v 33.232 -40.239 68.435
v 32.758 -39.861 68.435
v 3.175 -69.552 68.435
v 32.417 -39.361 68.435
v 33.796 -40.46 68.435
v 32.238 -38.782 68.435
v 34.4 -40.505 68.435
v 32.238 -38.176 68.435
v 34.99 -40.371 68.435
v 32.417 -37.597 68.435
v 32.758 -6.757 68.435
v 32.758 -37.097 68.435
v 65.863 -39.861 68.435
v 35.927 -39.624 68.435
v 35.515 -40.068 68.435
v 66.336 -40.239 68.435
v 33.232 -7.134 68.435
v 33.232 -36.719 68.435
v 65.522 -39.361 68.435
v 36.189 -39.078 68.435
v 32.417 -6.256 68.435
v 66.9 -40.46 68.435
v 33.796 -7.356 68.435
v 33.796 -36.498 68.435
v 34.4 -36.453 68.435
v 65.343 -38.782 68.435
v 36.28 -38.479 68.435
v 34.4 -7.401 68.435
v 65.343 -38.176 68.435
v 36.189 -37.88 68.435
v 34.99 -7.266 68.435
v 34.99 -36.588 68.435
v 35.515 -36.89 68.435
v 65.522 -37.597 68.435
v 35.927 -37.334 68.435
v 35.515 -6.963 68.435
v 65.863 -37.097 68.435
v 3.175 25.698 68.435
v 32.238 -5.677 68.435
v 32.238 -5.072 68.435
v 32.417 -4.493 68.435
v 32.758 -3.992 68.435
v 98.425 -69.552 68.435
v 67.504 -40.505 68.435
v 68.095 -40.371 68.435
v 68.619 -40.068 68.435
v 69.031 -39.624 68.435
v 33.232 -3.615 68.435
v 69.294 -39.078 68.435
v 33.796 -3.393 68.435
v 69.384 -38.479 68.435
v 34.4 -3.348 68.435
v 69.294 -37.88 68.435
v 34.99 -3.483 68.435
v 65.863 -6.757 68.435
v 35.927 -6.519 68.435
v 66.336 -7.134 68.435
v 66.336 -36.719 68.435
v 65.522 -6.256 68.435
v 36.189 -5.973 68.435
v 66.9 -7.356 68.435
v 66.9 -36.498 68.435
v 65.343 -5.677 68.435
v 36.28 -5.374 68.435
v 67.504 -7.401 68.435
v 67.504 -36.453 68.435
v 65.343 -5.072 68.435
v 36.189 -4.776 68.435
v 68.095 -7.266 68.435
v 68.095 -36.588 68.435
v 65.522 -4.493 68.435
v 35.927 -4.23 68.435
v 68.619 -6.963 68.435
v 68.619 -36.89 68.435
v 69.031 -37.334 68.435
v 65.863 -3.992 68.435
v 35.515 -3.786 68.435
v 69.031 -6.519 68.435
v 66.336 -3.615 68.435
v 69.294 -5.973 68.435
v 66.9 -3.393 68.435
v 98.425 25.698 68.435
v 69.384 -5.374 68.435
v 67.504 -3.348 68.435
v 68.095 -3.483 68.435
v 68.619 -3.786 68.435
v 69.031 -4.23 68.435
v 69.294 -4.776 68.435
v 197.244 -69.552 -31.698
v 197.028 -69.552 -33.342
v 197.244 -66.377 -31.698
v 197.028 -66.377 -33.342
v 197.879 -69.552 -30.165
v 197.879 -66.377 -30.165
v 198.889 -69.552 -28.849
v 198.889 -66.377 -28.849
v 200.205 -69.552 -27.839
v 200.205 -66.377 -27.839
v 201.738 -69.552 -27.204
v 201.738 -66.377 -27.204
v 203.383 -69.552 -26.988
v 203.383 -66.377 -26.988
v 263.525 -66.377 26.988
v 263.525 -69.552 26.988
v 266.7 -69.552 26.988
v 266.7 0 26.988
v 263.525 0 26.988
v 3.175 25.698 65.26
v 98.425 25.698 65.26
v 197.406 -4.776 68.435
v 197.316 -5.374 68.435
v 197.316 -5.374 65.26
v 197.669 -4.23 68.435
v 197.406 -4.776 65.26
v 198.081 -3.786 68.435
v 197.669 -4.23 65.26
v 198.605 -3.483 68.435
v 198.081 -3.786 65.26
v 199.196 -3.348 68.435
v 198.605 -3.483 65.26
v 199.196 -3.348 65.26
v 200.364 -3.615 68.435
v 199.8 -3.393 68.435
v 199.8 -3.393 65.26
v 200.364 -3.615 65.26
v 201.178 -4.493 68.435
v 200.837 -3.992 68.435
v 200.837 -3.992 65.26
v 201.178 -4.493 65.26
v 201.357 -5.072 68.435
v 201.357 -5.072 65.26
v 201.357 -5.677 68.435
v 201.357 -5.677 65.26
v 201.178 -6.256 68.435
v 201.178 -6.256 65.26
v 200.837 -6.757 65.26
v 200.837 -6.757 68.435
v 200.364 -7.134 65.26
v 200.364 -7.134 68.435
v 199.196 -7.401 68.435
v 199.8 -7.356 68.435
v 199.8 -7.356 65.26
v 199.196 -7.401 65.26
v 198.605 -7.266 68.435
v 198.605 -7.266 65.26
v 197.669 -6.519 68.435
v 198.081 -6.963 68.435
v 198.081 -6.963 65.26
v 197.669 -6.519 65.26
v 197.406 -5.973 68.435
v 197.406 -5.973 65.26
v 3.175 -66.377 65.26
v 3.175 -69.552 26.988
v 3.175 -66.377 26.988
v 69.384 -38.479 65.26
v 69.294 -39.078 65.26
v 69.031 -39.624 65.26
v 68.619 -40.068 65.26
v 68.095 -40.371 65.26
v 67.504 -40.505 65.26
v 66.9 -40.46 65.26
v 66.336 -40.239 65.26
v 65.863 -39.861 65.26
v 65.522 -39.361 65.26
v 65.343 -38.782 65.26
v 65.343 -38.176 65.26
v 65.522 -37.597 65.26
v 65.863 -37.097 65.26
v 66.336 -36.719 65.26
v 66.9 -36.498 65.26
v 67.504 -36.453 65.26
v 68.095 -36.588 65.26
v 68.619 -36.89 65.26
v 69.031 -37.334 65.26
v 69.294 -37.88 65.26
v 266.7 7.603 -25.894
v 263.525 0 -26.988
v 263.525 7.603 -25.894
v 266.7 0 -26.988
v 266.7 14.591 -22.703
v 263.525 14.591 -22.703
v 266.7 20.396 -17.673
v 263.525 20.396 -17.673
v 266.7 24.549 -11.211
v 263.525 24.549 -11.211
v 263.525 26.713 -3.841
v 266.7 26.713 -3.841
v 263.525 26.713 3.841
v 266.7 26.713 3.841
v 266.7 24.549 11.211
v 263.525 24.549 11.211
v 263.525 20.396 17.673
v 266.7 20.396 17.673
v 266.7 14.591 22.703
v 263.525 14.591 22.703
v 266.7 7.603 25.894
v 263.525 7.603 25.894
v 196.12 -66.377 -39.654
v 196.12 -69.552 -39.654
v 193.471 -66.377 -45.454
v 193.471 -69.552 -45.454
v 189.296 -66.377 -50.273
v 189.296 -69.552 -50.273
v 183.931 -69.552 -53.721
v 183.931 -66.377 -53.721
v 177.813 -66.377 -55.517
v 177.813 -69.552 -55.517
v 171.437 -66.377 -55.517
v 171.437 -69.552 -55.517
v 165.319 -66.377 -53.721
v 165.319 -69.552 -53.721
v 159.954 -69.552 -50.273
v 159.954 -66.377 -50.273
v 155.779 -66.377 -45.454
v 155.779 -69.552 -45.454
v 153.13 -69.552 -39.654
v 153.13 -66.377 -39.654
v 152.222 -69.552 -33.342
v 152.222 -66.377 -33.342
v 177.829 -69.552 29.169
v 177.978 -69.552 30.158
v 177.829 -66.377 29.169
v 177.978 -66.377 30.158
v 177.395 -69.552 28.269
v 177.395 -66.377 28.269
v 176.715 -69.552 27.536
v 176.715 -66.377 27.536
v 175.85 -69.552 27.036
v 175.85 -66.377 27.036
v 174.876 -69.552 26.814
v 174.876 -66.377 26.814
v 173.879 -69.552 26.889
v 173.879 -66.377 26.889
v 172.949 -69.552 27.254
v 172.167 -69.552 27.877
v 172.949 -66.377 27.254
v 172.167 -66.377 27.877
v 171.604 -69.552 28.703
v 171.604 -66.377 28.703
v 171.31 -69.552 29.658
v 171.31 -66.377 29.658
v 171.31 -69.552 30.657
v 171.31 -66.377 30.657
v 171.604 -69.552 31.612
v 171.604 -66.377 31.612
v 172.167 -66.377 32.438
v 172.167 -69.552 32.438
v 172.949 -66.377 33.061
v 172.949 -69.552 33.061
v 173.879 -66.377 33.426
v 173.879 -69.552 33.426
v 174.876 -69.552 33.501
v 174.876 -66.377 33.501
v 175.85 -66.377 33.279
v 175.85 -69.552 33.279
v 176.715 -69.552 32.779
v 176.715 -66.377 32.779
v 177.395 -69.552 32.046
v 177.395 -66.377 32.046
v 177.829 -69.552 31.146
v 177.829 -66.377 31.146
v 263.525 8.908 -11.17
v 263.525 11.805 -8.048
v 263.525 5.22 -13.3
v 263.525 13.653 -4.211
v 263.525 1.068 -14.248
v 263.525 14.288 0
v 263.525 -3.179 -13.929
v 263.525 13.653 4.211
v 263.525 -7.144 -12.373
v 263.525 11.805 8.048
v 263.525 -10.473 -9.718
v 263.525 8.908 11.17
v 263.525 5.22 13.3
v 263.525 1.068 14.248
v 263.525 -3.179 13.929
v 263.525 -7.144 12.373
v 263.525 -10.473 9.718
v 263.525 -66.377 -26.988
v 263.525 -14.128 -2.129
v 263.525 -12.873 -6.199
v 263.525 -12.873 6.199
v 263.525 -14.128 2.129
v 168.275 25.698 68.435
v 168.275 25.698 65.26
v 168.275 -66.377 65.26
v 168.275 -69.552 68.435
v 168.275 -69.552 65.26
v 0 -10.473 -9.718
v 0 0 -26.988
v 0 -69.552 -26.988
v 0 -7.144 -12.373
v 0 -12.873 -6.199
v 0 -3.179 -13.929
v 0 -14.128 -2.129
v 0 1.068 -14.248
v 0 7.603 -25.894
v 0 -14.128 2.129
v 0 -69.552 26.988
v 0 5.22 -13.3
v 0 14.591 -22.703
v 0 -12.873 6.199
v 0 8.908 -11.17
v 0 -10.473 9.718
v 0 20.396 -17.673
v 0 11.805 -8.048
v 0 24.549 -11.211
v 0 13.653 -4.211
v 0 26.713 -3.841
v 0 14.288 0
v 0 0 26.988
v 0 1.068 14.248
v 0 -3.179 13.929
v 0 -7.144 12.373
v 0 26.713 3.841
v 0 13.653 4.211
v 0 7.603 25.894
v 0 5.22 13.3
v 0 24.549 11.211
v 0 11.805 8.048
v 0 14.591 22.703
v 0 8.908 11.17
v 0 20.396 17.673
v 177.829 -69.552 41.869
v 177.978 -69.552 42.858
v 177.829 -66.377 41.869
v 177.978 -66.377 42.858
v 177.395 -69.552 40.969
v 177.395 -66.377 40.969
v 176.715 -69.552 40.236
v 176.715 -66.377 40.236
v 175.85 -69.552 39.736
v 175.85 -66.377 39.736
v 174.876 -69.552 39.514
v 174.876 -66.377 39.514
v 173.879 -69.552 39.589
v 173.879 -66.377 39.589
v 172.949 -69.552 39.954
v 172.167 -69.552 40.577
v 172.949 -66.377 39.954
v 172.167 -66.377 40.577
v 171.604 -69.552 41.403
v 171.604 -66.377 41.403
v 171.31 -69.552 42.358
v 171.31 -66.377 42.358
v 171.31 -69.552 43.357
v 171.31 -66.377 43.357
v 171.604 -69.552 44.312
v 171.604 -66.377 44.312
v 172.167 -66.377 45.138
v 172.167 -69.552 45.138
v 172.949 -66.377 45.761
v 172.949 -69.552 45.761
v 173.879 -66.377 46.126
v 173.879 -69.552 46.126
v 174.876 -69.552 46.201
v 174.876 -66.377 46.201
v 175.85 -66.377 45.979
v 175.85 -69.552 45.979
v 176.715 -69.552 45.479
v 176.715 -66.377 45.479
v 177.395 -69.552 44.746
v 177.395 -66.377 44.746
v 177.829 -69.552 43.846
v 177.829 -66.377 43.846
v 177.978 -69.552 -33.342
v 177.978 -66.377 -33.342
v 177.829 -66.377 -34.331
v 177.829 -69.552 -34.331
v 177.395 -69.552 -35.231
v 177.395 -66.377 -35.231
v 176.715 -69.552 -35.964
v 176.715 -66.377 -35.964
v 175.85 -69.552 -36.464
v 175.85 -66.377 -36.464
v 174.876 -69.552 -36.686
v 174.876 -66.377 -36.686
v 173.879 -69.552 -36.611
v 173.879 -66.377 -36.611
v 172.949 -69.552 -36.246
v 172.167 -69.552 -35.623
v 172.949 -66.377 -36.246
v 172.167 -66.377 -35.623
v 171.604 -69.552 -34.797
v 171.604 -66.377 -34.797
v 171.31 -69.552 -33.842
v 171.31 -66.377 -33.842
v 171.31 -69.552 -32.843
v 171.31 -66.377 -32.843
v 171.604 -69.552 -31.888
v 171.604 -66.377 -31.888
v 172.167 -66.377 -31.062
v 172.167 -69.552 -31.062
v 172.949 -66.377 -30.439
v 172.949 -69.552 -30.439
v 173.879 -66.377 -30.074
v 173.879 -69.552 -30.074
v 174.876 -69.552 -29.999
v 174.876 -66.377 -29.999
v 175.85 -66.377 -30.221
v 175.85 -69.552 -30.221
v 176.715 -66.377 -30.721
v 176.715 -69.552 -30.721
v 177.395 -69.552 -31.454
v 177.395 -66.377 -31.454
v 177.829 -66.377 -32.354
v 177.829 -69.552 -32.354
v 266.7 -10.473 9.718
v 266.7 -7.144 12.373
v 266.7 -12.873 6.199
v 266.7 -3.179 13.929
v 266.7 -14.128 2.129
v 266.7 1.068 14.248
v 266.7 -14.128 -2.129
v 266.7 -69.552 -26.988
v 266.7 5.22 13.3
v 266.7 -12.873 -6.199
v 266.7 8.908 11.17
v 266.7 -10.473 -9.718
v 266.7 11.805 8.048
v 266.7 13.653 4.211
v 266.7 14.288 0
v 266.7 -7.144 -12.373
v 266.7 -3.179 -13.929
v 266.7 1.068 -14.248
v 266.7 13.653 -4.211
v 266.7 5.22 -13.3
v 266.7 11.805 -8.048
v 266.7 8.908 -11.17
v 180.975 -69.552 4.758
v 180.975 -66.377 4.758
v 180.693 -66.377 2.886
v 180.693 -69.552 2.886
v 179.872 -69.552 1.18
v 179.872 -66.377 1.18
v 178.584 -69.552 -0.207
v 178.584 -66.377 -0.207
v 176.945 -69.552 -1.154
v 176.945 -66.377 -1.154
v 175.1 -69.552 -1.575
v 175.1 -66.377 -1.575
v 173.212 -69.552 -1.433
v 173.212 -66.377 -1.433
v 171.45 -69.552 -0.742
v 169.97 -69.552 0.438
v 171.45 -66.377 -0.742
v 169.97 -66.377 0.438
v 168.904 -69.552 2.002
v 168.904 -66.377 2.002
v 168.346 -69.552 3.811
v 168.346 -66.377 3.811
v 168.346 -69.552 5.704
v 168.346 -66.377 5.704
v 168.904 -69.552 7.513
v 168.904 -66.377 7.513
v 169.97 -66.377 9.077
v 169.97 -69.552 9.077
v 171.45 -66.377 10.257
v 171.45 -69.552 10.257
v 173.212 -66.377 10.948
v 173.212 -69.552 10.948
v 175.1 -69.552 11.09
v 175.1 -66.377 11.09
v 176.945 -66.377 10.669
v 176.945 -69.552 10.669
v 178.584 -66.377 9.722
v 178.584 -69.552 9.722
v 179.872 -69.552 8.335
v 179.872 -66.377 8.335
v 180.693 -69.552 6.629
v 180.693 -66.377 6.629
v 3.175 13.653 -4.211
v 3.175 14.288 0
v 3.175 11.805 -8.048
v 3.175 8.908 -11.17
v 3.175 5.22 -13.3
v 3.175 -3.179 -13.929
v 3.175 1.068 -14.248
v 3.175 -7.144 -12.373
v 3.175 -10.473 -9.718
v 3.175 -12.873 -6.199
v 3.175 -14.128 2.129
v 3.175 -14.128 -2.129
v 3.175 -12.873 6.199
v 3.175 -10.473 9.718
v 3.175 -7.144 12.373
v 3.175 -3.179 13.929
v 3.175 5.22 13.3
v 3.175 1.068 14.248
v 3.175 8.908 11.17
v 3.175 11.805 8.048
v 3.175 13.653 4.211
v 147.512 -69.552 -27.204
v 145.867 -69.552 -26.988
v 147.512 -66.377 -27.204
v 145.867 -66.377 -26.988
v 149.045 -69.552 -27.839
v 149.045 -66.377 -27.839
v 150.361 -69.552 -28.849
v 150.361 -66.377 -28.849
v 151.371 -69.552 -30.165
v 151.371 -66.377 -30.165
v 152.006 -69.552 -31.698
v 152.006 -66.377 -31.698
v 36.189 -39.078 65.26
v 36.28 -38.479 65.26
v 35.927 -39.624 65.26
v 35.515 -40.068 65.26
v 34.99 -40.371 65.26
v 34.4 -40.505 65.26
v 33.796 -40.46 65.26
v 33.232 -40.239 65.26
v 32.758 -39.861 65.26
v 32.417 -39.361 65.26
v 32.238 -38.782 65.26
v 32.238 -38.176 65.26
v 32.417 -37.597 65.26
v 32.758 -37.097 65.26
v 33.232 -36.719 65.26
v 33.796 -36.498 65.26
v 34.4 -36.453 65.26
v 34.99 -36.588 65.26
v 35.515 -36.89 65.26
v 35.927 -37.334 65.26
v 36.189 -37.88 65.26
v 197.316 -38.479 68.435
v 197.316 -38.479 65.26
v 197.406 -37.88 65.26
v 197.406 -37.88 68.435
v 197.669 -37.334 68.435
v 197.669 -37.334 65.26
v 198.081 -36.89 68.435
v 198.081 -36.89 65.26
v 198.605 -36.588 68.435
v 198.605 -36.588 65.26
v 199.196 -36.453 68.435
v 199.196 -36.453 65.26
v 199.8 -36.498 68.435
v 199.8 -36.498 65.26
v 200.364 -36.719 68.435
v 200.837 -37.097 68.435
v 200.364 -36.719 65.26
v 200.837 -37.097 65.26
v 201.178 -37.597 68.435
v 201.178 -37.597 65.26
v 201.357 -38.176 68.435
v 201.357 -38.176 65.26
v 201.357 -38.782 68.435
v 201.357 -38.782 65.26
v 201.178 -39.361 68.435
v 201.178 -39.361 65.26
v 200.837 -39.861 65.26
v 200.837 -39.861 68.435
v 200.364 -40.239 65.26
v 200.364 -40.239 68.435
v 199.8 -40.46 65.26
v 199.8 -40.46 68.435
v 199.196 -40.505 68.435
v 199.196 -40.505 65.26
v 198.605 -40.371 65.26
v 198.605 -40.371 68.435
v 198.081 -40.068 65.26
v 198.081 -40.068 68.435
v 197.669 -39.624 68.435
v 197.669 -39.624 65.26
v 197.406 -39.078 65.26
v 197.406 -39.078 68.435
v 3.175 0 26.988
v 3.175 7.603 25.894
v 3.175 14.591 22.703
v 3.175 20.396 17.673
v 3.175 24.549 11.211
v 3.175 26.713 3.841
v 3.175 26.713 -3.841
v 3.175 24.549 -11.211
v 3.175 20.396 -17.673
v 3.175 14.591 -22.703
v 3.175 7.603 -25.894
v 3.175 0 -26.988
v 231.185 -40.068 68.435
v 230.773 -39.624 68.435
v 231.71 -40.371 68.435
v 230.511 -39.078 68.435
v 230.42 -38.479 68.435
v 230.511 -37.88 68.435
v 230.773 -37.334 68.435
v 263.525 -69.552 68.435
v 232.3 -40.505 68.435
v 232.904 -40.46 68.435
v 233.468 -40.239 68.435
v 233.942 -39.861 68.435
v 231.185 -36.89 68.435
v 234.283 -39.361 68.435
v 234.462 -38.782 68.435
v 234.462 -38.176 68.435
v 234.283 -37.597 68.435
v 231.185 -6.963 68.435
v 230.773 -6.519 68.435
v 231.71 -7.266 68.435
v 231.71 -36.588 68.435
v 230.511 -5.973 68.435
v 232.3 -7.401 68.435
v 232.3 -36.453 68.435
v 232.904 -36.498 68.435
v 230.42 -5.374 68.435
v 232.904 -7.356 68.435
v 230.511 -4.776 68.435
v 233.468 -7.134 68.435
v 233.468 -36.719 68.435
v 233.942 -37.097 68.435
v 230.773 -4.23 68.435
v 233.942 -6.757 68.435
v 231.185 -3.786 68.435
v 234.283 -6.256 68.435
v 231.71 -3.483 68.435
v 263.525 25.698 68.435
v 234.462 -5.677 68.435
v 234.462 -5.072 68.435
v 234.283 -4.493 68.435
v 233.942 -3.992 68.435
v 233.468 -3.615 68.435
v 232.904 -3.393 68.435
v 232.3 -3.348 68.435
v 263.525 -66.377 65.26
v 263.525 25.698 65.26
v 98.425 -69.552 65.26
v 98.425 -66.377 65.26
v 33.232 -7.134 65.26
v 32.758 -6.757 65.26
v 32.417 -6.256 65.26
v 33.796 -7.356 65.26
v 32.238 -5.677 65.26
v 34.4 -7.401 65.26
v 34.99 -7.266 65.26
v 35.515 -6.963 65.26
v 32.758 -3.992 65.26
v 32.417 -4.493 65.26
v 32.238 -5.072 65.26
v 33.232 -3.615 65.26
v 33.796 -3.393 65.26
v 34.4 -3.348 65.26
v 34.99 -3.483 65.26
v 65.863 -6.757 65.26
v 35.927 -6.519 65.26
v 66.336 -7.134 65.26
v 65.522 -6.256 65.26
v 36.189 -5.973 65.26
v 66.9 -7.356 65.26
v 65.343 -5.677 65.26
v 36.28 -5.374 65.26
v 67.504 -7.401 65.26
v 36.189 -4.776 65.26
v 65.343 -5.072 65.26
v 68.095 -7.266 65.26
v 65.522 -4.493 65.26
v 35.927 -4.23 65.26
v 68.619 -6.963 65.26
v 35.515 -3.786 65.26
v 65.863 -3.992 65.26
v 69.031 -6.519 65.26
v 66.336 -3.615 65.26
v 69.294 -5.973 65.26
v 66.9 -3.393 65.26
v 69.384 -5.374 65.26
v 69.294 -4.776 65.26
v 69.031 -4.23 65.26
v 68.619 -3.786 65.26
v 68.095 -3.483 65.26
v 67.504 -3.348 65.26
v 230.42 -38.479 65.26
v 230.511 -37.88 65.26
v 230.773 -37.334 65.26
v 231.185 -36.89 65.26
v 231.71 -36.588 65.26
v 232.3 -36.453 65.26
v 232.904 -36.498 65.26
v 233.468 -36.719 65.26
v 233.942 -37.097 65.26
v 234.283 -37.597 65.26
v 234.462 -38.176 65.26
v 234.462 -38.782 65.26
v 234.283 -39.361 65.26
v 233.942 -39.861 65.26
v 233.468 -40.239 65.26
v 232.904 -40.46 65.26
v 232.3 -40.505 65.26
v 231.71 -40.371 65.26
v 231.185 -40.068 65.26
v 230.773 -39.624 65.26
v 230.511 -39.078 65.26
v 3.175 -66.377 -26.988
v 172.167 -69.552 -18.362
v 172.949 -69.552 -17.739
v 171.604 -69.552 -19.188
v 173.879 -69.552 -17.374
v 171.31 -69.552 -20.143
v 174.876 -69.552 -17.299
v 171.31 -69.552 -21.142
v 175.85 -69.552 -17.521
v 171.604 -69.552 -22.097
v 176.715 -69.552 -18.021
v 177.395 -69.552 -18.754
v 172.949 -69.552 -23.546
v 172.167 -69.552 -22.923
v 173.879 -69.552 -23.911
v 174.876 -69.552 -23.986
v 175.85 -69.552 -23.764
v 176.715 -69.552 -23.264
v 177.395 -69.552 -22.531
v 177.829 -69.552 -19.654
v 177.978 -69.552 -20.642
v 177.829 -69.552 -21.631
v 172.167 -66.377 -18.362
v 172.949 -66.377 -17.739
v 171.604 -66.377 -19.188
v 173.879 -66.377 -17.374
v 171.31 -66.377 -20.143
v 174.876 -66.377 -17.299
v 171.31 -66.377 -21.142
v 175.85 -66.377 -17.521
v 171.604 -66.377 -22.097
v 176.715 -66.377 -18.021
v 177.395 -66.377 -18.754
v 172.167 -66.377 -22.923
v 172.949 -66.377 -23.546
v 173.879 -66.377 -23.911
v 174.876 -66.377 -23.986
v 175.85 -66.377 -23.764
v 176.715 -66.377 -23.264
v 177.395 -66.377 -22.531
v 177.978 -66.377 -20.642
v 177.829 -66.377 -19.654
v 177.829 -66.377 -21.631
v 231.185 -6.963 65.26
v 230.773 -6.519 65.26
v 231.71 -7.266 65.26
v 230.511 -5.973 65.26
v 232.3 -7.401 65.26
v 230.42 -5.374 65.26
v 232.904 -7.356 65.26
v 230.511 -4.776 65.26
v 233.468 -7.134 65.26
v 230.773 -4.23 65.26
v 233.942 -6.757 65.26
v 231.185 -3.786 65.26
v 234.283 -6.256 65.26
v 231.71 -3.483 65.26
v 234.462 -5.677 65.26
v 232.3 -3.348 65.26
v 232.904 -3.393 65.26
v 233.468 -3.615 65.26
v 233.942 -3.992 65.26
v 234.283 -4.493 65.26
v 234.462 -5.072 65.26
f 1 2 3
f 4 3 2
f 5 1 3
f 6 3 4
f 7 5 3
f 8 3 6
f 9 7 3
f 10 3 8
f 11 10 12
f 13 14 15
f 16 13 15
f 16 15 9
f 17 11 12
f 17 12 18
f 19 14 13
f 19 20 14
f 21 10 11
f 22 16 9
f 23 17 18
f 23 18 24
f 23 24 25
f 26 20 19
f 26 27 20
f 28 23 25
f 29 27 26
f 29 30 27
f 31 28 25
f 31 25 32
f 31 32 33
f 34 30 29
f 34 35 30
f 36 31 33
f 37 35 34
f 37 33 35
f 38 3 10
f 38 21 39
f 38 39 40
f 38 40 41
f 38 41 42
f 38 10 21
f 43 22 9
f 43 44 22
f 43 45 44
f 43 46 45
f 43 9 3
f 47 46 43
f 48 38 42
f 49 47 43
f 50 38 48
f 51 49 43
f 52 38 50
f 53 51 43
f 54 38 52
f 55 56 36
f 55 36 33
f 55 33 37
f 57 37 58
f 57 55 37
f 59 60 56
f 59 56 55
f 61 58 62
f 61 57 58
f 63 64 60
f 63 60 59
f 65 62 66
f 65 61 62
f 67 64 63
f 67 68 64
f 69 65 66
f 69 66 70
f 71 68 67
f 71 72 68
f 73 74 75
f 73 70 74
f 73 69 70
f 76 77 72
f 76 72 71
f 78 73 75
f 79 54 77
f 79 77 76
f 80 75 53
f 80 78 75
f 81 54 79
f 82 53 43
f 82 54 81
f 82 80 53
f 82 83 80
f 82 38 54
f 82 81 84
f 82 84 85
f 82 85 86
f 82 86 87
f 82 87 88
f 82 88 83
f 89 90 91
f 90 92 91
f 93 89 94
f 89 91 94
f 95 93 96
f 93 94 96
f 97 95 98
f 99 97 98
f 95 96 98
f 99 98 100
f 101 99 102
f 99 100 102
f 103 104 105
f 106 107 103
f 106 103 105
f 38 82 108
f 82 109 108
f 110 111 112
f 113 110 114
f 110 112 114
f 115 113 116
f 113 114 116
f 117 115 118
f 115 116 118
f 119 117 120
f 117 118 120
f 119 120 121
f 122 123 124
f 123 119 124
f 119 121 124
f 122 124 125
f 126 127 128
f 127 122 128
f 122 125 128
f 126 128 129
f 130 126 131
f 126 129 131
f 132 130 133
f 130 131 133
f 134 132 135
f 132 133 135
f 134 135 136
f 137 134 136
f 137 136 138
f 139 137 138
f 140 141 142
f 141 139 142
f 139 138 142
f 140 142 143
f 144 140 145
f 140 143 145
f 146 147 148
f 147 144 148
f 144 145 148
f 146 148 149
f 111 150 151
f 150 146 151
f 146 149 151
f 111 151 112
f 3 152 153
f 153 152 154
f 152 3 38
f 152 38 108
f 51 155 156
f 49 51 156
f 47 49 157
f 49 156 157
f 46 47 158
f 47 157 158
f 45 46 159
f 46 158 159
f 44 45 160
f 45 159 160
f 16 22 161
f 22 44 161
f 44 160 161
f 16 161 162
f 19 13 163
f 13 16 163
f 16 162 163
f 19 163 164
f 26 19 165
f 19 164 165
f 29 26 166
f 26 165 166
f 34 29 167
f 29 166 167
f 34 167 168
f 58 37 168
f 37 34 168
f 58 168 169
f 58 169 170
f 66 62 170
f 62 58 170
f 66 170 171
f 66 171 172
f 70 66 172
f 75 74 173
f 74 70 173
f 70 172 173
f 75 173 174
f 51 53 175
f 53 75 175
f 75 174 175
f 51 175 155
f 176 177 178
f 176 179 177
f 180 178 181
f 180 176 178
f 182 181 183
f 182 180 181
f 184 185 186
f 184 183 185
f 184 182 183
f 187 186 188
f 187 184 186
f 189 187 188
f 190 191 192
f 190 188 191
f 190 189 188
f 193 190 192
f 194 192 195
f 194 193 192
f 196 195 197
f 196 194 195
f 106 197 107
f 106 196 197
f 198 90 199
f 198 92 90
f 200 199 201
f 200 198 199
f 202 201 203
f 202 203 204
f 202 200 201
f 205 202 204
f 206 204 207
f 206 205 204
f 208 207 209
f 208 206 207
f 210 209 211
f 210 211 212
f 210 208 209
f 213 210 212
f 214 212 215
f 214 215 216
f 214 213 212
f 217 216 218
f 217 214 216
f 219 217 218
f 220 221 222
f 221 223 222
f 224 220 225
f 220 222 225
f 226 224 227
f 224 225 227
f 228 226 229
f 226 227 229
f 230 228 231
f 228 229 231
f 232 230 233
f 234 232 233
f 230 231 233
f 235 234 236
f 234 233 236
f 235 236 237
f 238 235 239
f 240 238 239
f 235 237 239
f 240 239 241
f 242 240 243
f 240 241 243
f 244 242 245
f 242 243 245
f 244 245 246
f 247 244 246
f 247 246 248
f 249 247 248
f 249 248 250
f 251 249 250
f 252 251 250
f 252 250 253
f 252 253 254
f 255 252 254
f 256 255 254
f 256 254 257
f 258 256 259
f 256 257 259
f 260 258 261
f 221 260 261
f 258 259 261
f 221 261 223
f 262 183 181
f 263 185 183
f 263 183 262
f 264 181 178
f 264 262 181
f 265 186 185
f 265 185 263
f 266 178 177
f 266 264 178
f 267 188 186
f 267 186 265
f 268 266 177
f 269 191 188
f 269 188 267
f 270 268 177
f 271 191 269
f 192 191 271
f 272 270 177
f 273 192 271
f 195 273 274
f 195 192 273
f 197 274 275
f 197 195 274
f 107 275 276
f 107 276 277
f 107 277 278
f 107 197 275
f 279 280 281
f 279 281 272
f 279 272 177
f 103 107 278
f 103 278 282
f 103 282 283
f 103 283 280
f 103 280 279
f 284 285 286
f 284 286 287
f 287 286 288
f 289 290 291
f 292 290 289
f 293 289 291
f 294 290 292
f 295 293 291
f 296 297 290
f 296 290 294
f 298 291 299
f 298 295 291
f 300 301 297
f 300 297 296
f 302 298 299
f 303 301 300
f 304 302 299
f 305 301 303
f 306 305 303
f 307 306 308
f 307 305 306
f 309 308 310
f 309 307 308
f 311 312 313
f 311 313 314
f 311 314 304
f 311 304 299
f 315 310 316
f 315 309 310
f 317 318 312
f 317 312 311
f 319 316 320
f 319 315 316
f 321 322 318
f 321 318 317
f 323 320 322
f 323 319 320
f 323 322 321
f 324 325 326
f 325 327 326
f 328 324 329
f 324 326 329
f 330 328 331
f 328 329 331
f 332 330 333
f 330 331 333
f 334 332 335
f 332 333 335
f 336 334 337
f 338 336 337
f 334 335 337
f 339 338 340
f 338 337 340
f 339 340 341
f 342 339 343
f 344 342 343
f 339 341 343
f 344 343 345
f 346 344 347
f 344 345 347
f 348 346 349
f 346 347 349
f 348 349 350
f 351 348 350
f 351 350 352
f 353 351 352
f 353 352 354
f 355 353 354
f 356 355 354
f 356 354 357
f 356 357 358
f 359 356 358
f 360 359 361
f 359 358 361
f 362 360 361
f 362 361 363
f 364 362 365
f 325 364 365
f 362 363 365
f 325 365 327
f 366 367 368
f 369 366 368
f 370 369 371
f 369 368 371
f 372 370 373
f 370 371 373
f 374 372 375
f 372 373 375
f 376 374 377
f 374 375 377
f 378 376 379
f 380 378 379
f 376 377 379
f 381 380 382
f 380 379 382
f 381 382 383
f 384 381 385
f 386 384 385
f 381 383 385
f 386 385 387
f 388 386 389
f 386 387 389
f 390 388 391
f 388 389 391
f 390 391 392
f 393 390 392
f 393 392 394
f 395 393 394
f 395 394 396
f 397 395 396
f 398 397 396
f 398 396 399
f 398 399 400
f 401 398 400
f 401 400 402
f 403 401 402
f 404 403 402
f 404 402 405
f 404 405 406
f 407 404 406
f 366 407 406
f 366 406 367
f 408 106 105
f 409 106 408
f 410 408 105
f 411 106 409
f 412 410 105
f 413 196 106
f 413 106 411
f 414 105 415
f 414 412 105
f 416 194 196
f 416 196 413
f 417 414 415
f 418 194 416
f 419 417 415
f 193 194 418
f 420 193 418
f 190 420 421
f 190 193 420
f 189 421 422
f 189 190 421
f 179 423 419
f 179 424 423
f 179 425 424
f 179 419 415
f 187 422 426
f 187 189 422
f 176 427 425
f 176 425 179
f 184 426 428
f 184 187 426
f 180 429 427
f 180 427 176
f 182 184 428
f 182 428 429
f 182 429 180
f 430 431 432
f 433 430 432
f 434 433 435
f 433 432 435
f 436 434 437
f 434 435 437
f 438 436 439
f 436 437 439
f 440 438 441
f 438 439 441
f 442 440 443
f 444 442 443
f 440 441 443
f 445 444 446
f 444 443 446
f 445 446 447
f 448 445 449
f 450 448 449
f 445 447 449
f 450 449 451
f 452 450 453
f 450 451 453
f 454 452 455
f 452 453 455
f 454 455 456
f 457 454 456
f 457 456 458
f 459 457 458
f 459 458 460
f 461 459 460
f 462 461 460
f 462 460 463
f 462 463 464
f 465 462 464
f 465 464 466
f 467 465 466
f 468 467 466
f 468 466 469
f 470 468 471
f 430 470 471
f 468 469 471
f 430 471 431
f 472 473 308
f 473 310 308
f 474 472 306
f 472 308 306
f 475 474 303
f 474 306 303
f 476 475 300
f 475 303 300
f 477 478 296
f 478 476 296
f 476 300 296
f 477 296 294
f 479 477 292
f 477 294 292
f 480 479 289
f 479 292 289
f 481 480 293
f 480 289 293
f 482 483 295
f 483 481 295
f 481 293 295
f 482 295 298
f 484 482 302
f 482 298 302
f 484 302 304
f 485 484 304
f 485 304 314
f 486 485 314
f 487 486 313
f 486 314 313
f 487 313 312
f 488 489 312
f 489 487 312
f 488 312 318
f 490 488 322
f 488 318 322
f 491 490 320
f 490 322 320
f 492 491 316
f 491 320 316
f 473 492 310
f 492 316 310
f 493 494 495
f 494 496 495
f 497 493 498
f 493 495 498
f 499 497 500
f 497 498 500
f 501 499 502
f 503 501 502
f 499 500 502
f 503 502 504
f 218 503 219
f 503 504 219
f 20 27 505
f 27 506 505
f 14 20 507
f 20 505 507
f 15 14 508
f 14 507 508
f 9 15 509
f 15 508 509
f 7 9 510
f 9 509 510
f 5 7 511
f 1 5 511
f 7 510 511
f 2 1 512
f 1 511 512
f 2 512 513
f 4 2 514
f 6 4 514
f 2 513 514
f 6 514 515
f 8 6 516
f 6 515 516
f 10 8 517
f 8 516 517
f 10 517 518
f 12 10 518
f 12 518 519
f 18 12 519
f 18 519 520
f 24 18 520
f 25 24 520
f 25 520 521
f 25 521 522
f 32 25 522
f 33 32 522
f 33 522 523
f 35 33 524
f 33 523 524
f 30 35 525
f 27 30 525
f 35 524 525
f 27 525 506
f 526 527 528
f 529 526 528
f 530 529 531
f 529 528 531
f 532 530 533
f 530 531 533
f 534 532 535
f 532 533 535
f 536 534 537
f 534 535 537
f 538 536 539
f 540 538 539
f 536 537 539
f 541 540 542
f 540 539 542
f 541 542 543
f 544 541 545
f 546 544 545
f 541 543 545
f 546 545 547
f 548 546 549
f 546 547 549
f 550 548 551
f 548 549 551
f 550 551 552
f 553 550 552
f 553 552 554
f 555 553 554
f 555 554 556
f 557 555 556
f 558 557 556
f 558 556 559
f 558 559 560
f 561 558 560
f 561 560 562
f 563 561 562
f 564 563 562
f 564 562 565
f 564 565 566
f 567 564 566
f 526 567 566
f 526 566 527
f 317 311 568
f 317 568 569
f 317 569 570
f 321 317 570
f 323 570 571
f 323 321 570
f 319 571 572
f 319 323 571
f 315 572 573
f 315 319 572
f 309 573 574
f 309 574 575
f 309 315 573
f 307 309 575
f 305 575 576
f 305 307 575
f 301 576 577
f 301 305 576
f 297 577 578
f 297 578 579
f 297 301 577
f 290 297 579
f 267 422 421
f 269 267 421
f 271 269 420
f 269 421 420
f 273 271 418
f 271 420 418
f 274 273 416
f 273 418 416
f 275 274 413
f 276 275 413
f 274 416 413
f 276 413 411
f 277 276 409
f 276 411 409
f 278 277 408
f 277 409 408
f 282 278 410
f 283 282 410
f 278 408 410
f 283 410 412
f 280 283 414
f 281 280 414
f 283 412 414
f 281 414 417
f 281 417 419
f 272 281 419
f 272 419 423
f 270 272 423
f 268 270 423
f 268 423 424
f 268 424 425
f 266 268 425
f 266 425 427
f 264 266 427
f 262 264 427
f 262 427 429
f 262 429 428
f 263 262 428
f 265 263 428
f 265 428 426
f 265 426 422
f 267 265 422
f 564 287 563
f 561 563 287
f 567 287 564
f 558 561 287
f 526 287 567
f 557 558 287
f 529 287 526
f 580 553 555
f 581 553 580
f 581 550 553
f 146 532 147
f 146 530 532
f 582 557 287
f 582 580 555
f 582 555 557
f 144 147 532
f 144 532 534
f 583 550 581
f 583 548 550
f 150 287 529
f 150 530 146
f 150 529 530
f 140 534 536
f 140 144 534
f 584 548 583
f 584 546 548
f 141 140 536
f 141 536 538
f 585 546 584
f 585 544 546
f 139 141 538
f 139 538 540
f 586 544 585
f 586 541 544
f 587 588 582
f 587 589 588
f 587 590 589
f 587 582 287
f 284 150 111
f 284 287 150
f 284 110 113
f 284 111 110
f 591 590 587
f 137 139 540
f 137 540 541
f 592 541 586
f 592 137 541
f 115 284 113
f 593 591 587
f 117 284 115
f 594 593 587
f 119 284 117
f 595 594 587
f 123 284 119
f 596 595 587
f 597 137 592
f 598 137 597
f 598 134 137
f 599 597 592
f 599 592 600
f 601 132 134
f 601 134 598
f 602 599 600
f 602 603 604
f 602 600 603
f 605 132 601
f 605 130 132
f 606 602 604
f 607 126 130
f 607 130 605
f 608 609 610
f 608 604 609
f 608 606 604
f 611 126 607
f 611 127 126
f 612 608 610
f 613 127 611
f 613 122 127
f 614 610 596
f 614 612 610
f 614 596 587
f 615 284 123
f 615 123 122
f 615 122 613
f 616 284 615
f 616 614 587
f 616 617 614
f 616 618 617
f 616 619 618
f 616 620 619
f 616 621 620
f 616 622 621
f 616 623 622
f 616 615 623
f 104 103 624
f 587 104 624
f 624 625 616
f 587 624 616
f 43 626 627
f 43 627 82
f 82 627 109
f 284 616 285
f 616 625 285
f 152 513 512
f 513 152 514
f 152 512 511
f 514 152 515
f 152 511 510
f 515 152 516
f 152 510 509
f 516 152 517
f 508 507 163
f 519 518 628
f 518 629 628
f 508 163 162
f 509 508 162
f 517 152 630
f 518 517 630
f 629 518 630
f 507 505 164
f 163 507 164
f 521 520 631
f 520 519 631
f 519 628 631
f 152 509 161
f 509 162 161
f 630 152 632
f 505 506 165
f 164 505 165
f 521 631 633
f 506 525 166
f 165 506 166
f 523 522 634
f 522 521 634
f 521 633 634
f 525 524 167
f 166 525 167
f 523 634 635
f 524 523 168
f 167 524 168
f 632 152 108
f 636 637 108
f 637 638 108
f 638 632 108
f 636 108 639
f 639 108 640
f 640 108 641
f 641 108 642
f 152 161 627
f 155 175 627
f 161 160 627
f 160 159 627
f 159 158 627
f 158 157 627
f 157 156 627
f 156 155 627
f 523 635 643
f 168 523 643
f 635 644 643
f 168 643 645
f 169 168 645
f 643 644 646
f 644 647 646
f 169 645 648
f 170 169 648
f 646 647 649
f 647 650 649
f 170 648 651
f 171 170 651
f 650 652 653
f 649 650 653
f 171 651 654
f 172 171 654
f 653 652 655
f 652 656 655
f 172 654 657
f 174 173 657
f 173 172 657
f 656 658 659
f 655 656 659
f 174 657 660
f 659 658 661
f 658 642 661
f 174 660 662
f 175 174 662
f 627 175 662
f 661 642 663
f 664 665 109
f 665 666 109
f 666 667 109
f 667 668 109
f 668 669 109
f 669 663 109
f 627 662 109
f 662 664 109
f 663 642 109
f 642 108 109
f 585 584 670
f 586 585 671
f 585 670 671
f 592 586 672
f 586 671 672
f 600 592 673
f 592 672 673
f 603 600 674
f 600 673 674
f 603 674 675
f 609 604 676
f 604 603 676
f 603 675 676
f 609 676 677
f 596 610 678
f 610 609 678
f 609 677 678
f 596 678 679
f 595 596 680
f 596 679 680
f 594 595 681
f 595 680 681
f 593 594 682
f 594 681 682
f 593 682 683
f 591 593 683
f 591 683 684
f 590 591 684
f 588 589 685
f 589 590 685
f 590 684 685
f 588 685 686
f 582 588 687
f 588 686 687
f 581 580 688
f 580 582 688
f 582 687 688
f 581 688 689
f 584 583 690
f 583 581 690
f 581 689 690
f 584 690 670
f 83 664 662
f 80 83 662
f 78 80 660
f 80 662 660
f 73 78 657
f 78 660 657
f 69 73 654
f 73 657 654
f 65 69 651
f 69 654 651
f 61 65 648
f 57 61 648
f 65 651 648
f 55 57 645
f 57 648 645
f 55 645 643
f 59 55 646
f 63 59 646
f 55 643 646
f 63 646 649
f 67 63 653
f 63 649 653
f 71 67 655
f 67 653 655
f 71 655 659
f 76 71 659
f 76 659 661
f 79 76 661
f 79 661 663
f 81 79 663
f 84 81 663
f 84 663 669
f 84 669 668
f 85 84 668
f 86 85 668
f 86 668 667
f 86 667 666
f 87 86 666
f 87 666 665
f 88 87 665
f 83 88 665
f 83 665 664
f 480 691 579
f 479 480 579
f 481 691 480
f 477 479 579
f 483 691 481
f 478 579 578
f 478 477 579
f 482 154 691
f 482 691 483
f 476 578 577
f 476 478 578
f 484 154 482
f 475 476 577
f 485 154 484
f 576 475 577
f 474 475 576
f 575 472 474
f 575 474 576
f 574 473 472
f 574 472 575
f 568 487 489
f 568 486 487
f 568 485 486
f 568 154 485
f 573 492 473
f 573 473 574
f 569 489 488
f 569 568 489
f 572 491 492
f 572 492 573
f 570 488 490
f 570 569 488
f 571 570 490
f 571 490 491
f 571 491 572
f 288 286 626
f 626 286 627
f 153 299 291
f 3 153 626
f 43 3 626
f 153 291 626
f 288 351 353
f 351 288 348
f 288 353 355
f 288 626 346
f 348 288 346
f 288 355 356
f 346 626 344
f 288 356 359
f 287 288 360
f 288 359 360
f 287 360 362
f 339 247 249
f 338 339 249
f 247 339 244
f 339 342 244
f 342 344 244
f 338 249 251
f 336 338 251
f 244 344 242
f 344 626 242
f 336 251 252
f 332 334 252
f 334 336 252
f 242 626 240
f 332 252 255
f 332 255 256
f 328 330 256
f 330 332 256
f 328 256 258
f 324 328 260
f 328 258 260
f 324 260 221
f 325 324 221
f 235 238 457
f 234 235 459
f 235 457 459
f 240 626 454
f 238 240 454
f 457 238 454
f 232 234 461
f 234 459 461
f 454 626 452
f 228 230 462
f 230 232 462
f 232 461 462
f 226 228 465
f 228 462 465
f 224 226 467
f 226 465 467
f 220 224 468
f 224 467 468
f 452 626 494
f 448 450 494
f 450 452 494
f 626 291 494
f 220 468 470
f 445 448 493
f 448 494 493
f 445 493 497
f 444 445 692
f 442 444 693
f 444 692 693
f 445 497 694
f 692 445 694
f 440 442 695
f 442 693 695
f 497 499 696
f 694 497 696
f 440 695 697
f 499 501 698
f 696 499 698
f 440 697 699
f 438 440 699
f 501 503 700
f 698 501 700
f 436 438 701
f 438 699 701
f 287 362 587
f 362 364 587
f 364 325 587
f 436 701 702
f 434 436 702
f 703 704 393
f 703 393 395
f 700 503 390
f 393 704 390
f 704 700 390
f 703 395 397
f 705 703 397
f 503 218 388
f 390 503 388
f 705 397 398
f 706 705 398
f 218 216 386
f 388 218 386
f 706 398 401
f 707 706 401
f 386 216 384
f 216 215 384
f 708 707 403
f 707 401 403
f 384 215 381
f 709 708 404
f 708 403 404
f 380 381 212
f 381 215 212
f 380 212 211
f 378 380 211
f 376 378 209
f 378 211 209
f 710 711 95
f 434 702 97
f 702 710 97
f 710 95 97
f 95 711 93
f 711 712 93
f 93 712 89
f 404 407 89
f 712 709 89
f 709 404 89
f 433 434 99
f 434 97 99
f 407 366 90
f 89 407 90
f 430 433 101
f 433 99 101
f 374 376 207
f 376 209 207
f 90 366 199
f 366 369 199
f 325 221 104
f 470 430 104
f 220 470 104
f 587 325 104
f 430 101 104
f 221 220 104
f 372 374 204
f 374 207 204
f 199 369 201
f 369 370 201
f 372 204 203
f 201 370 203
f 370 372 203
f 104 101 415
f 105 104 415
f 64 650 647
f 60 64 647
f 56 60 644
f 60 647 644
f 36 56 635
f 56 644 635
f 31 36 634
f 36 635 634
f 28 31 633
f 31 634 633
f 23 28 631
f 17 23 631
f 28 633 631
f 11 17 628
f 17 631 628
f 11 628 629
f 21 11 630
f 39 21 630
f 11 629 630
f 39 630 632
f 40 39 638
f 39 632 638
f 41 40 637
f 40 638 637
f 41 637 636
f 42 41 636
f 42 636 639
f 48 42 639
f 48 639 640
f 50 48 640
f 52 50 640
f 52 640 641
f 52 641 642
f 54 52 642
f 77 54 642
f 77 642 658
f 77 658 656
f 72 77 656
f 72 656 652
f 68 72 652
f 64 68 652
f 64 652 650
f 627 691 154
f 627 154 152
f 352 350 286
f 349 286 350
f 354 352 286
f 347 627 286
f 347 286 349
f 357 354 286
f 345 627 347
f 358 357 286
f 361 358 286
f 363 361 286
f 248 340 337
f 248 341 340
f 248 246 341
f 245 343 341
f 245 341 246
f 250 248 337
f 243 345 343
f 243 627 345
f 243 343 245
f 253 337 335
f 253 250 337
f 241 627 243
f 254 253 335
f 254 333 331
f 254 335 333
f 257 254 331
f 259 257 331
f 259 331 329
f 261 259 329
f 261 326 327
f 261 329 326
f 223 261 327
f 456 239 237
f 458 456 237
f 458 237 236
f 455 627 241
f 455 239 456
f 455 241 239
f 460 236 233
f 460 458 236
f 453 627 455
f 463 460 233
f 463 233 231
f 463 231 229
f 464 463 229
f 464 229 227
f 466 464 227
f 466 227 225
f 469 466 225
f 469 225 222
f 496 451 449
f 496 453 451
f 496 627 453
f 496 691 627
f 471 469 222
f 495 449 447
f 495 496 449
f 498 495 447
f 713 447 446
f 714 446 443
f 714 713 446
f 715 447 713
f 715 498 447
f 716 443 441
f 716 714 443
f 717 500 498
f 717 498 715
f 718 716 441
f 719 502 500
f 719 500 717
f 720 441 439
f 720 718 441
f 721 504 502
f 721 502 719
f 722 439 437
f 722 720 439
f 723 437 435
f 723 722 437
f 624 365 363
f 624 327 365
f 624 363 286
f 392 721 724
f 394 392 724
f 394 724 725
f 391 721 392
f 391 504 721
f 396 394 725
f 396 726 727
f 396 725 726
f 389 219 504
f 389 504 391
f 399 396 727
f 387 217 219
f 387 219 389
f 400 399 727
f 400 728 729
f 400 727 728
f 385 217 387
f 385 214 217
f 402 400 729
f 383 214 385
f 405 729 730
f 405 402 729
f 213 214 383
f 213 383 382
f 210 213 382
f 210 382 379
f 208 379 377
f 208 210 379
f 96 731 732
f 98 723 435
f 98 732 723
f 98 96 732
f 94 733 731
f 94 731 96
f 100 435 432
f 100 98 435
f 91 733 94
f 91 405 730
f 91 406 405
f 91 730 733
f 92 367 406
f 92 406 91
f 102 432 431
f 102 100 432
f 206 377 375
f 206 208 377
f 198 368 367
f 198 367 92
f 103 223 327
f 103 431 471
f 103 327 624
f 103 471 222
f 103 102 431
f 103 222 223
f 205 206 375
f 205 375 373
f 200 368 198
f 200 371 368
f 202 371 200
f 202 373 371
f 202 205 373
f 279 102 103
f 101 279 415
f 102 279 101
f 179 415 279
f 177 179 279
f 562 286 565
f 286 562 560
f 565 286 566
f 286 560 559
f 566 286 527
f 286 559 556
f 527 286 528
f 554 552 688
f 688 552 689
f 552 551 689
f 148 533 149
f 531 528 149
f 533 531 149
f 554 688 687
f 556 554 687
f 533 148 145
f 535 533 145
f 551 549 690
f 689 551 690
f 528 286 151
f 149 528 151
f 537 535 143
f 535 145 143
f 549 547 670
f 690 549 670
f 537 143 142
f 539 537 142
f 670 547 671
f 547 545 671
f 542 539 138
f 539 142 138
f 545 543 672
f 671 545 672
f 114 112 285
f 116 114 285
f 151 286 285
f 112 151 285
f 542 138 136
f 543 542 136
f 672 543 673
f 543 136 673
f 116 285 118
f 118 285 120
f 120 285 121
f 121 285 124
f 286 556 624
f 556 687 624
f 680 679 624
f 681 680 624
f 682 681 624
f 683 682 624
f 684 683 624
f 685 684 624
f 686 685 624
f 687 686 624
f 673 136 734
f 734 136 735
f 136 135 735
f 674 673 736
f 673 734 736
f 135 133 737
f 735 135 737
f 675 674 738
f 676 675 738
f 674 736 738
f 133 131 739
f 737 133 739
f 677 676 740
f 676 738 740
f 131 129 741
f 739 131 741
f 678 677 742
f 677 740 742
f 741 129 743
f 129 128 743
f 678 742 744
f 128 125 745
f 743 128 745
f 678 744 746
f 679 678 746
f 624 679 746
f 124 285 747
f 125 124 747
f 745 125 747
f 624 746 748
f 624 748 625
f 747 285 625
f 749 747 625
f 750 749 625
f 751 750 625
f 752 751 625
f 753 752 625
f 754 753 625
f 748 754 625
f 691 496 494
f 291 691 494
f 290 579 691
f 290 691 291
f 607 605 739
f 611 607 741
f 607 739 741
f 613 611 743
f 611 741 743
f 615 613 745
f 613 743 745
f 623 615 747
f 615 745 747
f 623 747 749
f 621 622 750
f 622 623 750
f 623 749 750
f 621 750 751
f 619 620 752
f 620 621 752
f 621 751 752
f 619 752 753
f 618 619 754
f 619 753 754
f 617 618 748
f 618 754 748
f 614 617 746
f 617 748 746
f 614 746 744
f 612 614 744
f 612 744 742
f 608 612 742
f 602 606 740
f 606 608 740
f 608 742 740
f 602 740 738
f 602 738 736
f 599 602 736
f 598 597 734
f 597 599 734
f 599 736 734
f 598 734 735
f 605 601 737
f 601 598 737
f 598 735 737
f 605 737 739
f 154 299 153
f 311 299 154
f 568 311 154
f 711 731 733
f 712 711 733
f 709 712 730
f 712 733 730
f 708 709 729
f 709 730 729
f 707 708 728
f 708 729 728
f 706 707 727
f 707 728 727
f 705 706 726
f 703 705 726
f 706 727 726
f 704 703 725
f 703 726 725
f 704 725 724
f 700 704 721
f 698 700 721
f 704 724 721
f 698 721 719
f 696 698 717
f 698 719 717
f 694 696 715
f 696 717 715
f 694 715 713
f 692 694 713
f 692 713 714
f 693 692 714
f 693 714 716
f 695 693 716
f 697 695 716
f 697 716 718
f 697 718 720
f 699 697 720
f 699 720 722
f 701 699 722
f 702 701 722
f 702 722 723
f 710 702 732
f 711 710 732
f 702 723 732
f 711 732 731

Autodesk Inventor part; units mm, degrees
ref_plane "YZ Plane" through (0, 0, 0) normal (1, 0, 0) x (0, 1, 0)
ref_plane "XZ Plane" through (0, 0, 0) normal (0, 1, 0) x (-1, 0, 0)
sketch "Sketch1" plane through (0, 0, 0) normal (1, 0, 0) x (0, 1, 0)
  circle A0 centre (0, 0) radius 14.2875
  line L0 (-66.3768, 26.9875) -> (-66.3768, -26.9875)
  circle A1 centre (0, 0) radius 26.9875
  line L1 (0, 26.9875) -> (-66.3768, 26.9875)
  line L2 (0, -26.9875) -> (-66.3768, -26.9875)
  point P0 (-66.3768, 0)
  dimension "d0" = 28.575
  dimension "d1" = 66.3768
  dimension "d2" = 53.975
  dimension "d3" = 12.7
extrude "Extrusion1" add sketch "Sketch1" along normal blind 3.175
sketch "Sketch2" plane through (0, -66.3768, -26.9875) normal (0, -1, 0) x (1, 0, 0)
  line L0 (0, 0) -> (0, 53.975) projected
  line L1 (0, 53.975) -> (133.35, 53.975)
  line L2 (133.35, 53.975) -> (133.35, 0)
  line L3 (133.35, 0) -> (0, 0)
  line L4 (0, 0) -> (0, 53.975)
  point P0 (0, 26.9875)
  dimension "d6" = 53.975
  dimension "d7" = 133.35
extrude "Extrusion2" add sketch "Sketch2" along normal blind 3.175
mirror "Mirror1" about plane through (133.35, -66.3768, -26.9875) normal (1, 0, 0)
sketch "Sketch3" plane through (0, -66.3768, -26.9875) normal (0, 1, 0) x (1, 0, 0)
  line L0 (3.175, -53.975) -> (3.175, 0) projected
  line L1 (3.175, -53.975) -> (263.525, -53.975) projected
  line L2 (263.525, -53.975) -> (263.525, 0) projected
  line L3 (263.525, 0) -> (3.175, 0) projected
  circle A0 centre (174.625, -31.745) radius 6.35
  circle A1 centre (174.625, -6.345) radius 3.3528
  circle A2 centre (174.625, 6.355) radius 3.3528
  circle A3 centre (174.625, -57.145) radius 3.3528
  circle A4 centre (174.625, -69.845) radius 3.3528
  arc A5 (152.2222, -69.845) -> (197.0278, -69.845) centre (174.625, -69.845) ccw
  arc A6 (197.0278, 6.355) -> (152.2222, 6.355) centre (174.625, 6.355) ccw
  line L4 (263.525, 0) -> (3.175, 0) projected
  line L5 (3.175, -53.975) -> (263.525, -53.975) projected
  arc A7 (197.0278, 6.355) -> (203.3828, 0) centre (203.3828, 6.355) ccw
  arc A8 (145.8672, 0) -> (152.2222, 6.355) centre (145.8672, 6.355) ccw
  arc A9 (152.2222, -69.845) -> (136.3522, -53.975) centre (136.3522, -69.845) ccw
  arc A10 (212.8978, -53.975) -> (197.0278, -69.845) centre (212.8978, -69.845) ccw
  point P0 (0, -26.9875)
  dimension "d10" = 22.23
  dimension "d11" = 12.7
  dimension "d12" = 47.63
  dimension "d13" = 6.7056
  dimension "d14" = 6.7056
  dimension "d15" = 60.33
  dimension "d16" = 6.7056
  dimension "d17" = 3.17
  dimension "d18" = 6.7056
  dimension "d19" = 15.87
  dimension "d20" = 88.9
  dimension "d21" = 19.05
  dimension "d22" = 19.05
extrude "Extrusion3" add sketch "Sketch3" against normal blind 3.175 contours L0 L3 L2 L1 A3 | L1 A3 A10 A5 A9 | A8 A6 A7 L3 | A3 L1 | L1 A3 | A0 | A1 | A2 | A4
extrude "Extrusion4" cut sketch "Sketch3" against normal blind 3.175 contours A3 L1 | L1 A3 | A0 | A1 | A2 | A4
sketch "Sketch4" plane through (0, -66.3768, -26.9875) normal (0, 1, 0) x (1, 0, 0)
  line L0 (3.175, -53.975) -> (3.175, 0) projected
  line L1 (3.175, -53.975) -> (263.525, -53.975)
  line L2 (263.525, -53.975) -> (263.525, -92.2478)
  line L3 (263.525, -92.2478) -> (3.175, -92.2478)
  line L4 (3.175, -92.2478) -> (3.175, -53.975)
  arc A0 (152.2222, -69.845) -> (197.0278, -69.845) centre (174.625, -69.845) ccw projected
  line L5 (263.525, -53.975) -> (263.525, 0) projected
  arc A1 (152.2222, -69.845) -> (197.0278, -69.845) centre (174.625, -69.845) ccw projected
  circle A2 centre (174.625, -69.845) radius 3.3528 projected
  circle A3 centre (174.625, -57.145) radius 3.3528 projected
  arc A4 (173.533, -53.975) -> (175.717, -53.975) centre (174.625, -57.145) ccw
  point P0 (0, -26.9875)
  point P1 (174.625, -92.2478)
extrude "Extrusion5" add sketch "Sketch4" against normal blind 3.175 contours L1 A3 L2 L3 L4
sketch "Sketch5" plane through (3.175, -66.3768, 65.2603) normal (0, 0, 1) x (1, 0, 0)
  line L0 (0, -3.175) -> (0, 0) projected
  line L1 (0, -3.175) -> (95.25, -3.175)
  line L2 (95.25, -3.175) -> (95.25, 92.075)
  line L3 (95.25, 92.075) -> (0, 92.075)
  line L4 (0, 92.075) -> (0, -3.175)
  circle A0 centre (31.0727, 61.0023) radius 2.032
  circle A1 centre (64.1773, 61.0023) radius 2.032
  circle A2 centre (64.1773, 27.8977) radius 2.032
  circle A3 centre (31.0727, 27.8977) radius 2.032
  line L5 (29.0407, 61.0023) -> (0, 61.0023)
  line L6 (33.1047, 61.0023) -> (62.1453, 61.0023)
  line L7 (66.2093, 61.0023) -> (95.25, 61.0023)
  line L8 (31.0727, 63.0343) -> (31.0727, 92.075)
  line L9 (31.0727, 58.9703) -> (31.0727, 29.9297)
  line L10 (31.0727, 25.8657) -> (31.0727, -3.175)
  point P0 (-3.175, 66.3768)
  dimension "d29" = 95.25
  dimension "d30" = 95.25
  dimension "d31" = 4.064
  dimension "d32" = 4.064
  dimension "d33" = 4.064
  dimension "d34" = 4.064
extrude "Extrusion6" add sketch "Sketch5" along normal blind 3.175 contours L0 L4 L5 A0 L9 A3 L10 L1 | L10 A3 L9 A0 L6 A1 L7 L2 L1 | L4 L3 L8 A0 L5 | L7 A1 L6 A0 L8 L3 L2
ref_plane "Work Plane1" through (133.35, 0, 0) normal (1, 0, 0) x (0, 0, -1)
mirror "Mirror2" about plane through (133.35, 0, 0) normal (1, 0, 0) of "Extrusion6"
properties part number "Another Motor Bracket"
